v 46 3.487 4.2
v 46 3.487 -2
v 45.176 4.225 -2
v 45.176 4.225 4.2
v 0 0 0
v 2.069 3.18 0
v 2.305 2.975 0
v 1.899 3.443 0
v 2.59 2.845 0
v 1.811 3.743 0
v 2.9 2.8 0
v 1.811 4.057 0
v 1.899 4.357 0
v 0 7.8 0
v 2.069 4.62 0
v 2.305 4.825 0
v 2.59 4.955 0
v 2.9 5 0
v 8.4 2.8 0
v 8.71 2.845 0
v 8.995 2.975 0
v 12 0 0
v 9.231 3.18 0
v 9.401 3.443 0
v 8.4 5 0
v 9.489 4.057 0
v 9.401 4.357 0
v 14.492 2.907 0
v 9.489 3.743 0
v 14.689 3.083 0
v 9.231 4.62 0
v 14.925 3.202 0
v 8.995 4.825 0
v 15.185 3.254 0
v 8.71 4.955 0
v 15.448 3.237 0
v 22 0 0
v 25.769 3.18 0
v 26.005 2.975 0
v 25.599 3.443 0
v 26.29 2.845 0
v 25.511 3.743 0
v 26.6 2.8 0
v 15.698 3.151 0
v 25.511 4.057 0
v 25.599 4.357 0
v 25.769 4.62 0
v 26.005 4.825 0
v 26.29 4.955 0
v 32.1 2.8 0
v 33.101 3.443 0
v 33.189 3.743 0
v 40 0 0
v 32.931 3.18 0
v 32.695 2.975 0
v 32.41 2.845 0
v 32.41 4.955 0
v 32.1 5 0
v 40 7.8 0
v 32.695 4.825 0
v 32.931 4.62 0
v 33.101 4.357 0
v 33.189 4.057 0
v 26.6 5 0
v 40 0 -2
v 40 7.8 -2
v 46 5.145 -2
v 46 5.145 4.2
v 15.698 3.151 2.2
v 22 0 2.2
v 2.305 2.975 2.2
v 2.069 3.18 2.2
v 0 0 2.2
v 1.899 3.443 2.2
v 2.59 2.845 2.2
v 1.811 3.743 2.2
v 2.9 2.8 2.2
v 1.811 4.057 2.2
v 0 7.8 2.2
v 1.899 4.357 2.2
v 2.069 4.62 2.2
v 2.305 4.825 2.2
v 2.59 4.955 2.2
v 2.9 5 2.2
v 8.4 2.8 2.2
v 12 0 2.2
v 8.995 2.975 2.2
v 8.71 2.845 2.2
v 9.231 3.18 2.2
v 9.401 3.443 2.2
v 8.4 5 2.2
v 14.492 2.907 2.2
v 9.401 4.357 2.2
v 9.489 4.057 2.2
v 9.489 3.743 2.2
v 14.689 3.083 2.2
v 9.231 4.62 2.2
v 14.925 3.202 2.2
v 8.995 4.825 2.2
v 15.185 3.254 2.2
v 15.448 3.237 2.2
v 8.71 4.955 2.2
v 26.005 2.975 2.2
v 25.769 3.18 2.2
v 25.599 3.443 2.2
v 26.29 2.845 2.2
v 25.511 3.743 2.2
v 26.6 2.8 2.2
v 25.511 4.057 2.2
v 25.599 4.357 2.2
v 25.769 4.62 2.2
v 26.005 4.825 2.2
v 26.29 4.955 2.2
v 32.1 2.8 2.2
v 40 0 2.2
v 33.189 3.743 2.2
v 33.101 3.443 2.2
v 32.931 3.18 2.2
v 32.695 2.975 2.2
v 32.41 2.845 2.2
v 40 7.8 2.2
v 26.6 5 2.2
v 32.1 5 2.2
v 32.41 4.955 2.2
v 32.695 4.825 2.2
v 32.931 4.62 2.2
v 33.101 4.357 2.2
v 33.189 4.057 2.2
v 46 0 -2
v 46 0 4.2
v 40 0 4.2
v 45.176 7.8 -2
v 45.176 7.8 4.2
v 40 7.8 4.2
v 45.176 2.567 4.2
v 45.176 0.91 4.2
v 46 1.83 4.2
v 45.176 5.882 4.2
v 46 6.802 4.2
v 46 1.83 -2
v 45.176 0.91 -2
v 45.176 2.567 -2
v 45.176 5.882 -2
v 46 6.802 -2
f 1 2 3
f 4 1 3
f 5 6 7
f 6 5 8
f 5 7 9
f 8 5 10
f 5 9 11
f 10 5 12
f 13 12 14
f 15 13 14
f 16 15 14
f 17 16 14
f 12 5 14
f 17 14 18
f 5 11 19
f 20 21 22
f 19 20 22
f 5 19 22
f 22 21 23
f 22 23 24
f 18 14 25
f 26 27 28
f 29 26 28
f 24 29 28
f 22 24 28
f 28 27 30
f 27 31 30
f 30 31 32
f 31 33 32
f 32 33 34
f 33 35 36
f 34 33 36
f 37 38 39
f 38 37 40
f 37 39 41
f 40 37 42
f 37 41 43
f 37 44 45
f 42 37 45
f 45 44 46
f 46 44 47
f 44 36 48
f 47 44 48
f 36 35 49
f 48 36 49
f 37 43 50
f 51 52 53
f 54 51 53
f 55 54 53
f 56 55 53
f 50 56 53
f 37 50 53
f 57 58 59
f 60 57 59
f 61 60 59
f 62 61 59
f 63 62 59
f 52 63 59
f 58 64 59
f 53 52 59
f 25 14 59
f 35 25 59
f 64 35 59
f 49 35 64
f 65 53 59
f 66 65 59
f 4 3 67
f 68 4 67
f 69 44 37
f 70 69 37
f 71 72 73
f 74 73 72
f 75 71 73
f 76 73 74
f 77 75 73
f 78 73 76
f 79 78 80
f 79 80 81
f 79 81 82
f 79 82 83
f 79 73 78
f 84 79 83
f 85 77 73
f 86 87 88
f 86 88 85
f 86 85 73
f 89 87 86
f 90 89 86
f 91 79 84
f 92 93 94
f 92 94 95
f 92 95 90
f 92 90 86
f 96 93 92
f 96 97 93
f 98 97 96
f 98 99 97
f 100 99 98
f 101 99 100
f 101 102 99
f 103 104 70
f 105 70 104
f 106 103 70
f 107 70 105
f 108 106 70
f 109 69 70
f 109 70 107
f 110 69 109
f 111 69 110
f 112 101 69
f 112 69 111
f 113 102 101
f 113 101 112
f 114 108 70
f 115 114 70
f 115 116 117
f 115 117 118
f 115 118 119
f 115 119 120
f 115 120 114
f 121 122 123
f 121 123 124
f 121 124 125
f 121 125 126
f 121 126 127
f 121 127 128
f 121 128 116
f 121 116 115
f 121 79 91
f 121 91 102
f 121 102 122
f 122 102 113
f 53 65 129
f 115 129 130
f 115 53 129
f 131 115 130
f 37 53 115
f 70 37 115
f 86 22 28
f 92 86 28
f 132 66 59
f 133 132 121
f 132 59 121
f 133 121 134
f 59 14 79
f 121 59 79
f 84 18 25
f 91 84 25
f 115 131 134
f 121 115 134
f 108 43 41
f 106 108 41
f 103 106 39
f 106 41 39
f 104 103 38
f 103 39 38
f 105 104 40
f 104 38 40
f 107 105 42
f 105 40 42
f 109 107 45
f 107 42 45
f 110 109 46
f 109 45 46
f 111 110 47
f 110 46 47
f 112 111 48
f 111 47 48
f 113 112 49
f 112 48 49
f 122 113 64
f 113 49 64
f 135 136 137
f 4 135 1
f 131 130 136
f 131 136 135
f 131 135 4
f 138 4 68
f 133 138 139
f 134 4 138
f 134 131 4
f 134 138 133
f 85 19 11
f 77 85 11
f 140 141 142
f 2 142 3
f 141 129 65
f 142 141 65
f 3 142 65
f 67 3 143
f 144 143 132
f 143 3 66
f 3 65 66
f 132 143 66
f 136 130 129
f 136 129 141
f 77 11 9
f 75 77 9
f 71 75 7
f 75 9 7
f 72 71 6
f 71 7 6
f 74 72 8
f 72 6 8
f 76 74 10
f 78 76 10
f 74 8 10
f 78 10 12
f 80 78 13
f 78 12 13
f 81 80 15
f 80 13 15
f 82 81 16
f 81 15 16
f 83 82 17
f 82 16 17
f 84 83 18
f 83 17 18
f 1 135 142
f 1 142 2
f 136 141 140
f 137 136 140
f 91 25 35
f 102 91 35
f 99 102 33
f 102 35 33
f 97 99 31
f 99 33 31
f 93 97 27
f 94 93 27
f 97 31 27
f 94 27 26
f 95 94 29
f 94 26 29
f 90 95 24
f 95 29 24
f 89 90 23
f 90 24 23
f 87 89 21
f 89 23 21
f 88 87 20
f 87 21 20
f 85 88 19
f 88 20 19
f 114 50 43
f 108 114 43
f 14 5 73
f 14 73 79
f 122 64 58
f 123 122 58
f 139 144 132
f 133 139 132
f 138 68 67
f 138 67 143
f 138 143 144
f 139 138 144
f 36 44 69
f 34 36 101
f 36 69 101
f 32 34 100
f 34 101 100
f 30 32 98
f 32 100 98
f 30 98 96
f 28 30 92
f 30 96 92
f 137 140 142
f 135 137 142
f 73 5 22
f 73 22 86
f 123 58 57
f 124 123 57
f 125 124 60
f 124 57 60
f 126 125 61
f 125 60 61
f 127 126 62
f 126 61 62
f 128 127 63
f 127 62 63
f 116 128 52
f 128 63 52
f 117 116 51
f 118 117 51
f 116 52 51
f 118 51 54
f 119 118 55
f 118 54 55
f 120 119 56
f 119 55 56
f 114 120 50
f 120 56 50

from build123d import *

# Parameters (mm, degrees)
F0_W      = 40
F0_H      = 7.8
F1_DEPTH  = 2.2
F2_W      = 7.8
F2_H      = 6.2
F3_DEPTH  = 6
F5_DEPTH  = 25
F7_DEPTH  = 25
F8_R      = 1
F10_DEPTH = 25
F12_DEPTH = 25


with BuildPart() as f1:
    # F0 (on Top) → F1 (new body)
    with BuildSketch(Plane.XY):
        with Locations((20, 3.9)):
            Rectangle(F0_W, F0_H)
    extrude(amount=F1_DEPTH)

    # F2 (on face) → F3 (join)
    with BuildSketch(Plane.YZ.offset(40)):
        with Locations((3.9, 1.1)):
            Rectangle(F2_W, F2_H)
    extrude(amount=F3_DEPTH)

    # F4 (on face) → F5 (cut)
    with BuildSketch(Plane(origin=(0, 0, -2), x_dir=(1, 0, 0), z_dir=(0, 0, -1))):
        Polygon((46, -1.829873), (46, 0), (45.176316, -0.90971), align=None)
        Polygon((46, -7.8), (46, -6.802324), (45.176316, -7.8), align=None)
        Polygon((46, -6.802324), (46, -5.144841), (45.176316, -5.882161), align=None)
        Polygon((46, -5.144841), (46, -3.487357), (45.176316, -4.224677), align=None)
        Polygon((46, -3.487357), (46, -1.829873), (45.176316, -2.567193), align=None)
    extrude(amount=-F5_DEPTH, mode=Mode.SUBTRACT)

    # F6 (on face) → F7 (cut)
    with BuildSketch(Plane(origin=(0, 0, 0), x_dir=(1, 0, 0), z_dir=(0, 0, -1))):
        Polygon((12, 0), (15, -3.5), (22, 0), align=None)
    extrude(amount=-F7_DEPTH, mode=Mode.SUBTRACT)

    # F8
    f8_edges = [f1.edges().sort_by_distance(p)[0] for p in [
        (15, 3.5, 1.1),
    ]]
    fillet(f8_edges, radius=F8_R)

    # F9 (on face) → F10 (cut)
    with BuildSketch(Plane(origin=(0, 0, 0), x_dir=(1, 0, 0), z_dir=(0, 0, -1))):
        with BuildLine():
            Line((8.4, -2.8), (2.9, -2.8))
            ThreePointArc((2.9, -2.8), (1.8, -3.9), (2.9, -5))
            Line((2.9, -5), (8.4, -5))
            ThreePointArc((8.4, -5), (9.5, -3.9), (8.4, -2.8))
        make_face()
    extrude(amount=-F10_DEPTH, mode=Mode.SUBTRACT)

    # F11 (on face) → F12 (cut)
    with BuildSketch(Plane(origin=(0, 0, 0), x_dir=(1, 0, 0), z_dir=(0, 0, -1))):
        with BuildLine():
            Line((32.1, -2.8), (26.6, -2.8))
            ThreePointArc((26.6, -2.8), (25.5, -3.9), (26.6, -5))
            Line((26.6, -5), (32.1, -5))
            ThreePointArc((32.1, -5), (33.2, -3.9), (32.1, -2.8))
        make_face()
    extrude(amount=-F12_DEPTH, mode=Mode.SUBTRACT)


solid = f1.part
